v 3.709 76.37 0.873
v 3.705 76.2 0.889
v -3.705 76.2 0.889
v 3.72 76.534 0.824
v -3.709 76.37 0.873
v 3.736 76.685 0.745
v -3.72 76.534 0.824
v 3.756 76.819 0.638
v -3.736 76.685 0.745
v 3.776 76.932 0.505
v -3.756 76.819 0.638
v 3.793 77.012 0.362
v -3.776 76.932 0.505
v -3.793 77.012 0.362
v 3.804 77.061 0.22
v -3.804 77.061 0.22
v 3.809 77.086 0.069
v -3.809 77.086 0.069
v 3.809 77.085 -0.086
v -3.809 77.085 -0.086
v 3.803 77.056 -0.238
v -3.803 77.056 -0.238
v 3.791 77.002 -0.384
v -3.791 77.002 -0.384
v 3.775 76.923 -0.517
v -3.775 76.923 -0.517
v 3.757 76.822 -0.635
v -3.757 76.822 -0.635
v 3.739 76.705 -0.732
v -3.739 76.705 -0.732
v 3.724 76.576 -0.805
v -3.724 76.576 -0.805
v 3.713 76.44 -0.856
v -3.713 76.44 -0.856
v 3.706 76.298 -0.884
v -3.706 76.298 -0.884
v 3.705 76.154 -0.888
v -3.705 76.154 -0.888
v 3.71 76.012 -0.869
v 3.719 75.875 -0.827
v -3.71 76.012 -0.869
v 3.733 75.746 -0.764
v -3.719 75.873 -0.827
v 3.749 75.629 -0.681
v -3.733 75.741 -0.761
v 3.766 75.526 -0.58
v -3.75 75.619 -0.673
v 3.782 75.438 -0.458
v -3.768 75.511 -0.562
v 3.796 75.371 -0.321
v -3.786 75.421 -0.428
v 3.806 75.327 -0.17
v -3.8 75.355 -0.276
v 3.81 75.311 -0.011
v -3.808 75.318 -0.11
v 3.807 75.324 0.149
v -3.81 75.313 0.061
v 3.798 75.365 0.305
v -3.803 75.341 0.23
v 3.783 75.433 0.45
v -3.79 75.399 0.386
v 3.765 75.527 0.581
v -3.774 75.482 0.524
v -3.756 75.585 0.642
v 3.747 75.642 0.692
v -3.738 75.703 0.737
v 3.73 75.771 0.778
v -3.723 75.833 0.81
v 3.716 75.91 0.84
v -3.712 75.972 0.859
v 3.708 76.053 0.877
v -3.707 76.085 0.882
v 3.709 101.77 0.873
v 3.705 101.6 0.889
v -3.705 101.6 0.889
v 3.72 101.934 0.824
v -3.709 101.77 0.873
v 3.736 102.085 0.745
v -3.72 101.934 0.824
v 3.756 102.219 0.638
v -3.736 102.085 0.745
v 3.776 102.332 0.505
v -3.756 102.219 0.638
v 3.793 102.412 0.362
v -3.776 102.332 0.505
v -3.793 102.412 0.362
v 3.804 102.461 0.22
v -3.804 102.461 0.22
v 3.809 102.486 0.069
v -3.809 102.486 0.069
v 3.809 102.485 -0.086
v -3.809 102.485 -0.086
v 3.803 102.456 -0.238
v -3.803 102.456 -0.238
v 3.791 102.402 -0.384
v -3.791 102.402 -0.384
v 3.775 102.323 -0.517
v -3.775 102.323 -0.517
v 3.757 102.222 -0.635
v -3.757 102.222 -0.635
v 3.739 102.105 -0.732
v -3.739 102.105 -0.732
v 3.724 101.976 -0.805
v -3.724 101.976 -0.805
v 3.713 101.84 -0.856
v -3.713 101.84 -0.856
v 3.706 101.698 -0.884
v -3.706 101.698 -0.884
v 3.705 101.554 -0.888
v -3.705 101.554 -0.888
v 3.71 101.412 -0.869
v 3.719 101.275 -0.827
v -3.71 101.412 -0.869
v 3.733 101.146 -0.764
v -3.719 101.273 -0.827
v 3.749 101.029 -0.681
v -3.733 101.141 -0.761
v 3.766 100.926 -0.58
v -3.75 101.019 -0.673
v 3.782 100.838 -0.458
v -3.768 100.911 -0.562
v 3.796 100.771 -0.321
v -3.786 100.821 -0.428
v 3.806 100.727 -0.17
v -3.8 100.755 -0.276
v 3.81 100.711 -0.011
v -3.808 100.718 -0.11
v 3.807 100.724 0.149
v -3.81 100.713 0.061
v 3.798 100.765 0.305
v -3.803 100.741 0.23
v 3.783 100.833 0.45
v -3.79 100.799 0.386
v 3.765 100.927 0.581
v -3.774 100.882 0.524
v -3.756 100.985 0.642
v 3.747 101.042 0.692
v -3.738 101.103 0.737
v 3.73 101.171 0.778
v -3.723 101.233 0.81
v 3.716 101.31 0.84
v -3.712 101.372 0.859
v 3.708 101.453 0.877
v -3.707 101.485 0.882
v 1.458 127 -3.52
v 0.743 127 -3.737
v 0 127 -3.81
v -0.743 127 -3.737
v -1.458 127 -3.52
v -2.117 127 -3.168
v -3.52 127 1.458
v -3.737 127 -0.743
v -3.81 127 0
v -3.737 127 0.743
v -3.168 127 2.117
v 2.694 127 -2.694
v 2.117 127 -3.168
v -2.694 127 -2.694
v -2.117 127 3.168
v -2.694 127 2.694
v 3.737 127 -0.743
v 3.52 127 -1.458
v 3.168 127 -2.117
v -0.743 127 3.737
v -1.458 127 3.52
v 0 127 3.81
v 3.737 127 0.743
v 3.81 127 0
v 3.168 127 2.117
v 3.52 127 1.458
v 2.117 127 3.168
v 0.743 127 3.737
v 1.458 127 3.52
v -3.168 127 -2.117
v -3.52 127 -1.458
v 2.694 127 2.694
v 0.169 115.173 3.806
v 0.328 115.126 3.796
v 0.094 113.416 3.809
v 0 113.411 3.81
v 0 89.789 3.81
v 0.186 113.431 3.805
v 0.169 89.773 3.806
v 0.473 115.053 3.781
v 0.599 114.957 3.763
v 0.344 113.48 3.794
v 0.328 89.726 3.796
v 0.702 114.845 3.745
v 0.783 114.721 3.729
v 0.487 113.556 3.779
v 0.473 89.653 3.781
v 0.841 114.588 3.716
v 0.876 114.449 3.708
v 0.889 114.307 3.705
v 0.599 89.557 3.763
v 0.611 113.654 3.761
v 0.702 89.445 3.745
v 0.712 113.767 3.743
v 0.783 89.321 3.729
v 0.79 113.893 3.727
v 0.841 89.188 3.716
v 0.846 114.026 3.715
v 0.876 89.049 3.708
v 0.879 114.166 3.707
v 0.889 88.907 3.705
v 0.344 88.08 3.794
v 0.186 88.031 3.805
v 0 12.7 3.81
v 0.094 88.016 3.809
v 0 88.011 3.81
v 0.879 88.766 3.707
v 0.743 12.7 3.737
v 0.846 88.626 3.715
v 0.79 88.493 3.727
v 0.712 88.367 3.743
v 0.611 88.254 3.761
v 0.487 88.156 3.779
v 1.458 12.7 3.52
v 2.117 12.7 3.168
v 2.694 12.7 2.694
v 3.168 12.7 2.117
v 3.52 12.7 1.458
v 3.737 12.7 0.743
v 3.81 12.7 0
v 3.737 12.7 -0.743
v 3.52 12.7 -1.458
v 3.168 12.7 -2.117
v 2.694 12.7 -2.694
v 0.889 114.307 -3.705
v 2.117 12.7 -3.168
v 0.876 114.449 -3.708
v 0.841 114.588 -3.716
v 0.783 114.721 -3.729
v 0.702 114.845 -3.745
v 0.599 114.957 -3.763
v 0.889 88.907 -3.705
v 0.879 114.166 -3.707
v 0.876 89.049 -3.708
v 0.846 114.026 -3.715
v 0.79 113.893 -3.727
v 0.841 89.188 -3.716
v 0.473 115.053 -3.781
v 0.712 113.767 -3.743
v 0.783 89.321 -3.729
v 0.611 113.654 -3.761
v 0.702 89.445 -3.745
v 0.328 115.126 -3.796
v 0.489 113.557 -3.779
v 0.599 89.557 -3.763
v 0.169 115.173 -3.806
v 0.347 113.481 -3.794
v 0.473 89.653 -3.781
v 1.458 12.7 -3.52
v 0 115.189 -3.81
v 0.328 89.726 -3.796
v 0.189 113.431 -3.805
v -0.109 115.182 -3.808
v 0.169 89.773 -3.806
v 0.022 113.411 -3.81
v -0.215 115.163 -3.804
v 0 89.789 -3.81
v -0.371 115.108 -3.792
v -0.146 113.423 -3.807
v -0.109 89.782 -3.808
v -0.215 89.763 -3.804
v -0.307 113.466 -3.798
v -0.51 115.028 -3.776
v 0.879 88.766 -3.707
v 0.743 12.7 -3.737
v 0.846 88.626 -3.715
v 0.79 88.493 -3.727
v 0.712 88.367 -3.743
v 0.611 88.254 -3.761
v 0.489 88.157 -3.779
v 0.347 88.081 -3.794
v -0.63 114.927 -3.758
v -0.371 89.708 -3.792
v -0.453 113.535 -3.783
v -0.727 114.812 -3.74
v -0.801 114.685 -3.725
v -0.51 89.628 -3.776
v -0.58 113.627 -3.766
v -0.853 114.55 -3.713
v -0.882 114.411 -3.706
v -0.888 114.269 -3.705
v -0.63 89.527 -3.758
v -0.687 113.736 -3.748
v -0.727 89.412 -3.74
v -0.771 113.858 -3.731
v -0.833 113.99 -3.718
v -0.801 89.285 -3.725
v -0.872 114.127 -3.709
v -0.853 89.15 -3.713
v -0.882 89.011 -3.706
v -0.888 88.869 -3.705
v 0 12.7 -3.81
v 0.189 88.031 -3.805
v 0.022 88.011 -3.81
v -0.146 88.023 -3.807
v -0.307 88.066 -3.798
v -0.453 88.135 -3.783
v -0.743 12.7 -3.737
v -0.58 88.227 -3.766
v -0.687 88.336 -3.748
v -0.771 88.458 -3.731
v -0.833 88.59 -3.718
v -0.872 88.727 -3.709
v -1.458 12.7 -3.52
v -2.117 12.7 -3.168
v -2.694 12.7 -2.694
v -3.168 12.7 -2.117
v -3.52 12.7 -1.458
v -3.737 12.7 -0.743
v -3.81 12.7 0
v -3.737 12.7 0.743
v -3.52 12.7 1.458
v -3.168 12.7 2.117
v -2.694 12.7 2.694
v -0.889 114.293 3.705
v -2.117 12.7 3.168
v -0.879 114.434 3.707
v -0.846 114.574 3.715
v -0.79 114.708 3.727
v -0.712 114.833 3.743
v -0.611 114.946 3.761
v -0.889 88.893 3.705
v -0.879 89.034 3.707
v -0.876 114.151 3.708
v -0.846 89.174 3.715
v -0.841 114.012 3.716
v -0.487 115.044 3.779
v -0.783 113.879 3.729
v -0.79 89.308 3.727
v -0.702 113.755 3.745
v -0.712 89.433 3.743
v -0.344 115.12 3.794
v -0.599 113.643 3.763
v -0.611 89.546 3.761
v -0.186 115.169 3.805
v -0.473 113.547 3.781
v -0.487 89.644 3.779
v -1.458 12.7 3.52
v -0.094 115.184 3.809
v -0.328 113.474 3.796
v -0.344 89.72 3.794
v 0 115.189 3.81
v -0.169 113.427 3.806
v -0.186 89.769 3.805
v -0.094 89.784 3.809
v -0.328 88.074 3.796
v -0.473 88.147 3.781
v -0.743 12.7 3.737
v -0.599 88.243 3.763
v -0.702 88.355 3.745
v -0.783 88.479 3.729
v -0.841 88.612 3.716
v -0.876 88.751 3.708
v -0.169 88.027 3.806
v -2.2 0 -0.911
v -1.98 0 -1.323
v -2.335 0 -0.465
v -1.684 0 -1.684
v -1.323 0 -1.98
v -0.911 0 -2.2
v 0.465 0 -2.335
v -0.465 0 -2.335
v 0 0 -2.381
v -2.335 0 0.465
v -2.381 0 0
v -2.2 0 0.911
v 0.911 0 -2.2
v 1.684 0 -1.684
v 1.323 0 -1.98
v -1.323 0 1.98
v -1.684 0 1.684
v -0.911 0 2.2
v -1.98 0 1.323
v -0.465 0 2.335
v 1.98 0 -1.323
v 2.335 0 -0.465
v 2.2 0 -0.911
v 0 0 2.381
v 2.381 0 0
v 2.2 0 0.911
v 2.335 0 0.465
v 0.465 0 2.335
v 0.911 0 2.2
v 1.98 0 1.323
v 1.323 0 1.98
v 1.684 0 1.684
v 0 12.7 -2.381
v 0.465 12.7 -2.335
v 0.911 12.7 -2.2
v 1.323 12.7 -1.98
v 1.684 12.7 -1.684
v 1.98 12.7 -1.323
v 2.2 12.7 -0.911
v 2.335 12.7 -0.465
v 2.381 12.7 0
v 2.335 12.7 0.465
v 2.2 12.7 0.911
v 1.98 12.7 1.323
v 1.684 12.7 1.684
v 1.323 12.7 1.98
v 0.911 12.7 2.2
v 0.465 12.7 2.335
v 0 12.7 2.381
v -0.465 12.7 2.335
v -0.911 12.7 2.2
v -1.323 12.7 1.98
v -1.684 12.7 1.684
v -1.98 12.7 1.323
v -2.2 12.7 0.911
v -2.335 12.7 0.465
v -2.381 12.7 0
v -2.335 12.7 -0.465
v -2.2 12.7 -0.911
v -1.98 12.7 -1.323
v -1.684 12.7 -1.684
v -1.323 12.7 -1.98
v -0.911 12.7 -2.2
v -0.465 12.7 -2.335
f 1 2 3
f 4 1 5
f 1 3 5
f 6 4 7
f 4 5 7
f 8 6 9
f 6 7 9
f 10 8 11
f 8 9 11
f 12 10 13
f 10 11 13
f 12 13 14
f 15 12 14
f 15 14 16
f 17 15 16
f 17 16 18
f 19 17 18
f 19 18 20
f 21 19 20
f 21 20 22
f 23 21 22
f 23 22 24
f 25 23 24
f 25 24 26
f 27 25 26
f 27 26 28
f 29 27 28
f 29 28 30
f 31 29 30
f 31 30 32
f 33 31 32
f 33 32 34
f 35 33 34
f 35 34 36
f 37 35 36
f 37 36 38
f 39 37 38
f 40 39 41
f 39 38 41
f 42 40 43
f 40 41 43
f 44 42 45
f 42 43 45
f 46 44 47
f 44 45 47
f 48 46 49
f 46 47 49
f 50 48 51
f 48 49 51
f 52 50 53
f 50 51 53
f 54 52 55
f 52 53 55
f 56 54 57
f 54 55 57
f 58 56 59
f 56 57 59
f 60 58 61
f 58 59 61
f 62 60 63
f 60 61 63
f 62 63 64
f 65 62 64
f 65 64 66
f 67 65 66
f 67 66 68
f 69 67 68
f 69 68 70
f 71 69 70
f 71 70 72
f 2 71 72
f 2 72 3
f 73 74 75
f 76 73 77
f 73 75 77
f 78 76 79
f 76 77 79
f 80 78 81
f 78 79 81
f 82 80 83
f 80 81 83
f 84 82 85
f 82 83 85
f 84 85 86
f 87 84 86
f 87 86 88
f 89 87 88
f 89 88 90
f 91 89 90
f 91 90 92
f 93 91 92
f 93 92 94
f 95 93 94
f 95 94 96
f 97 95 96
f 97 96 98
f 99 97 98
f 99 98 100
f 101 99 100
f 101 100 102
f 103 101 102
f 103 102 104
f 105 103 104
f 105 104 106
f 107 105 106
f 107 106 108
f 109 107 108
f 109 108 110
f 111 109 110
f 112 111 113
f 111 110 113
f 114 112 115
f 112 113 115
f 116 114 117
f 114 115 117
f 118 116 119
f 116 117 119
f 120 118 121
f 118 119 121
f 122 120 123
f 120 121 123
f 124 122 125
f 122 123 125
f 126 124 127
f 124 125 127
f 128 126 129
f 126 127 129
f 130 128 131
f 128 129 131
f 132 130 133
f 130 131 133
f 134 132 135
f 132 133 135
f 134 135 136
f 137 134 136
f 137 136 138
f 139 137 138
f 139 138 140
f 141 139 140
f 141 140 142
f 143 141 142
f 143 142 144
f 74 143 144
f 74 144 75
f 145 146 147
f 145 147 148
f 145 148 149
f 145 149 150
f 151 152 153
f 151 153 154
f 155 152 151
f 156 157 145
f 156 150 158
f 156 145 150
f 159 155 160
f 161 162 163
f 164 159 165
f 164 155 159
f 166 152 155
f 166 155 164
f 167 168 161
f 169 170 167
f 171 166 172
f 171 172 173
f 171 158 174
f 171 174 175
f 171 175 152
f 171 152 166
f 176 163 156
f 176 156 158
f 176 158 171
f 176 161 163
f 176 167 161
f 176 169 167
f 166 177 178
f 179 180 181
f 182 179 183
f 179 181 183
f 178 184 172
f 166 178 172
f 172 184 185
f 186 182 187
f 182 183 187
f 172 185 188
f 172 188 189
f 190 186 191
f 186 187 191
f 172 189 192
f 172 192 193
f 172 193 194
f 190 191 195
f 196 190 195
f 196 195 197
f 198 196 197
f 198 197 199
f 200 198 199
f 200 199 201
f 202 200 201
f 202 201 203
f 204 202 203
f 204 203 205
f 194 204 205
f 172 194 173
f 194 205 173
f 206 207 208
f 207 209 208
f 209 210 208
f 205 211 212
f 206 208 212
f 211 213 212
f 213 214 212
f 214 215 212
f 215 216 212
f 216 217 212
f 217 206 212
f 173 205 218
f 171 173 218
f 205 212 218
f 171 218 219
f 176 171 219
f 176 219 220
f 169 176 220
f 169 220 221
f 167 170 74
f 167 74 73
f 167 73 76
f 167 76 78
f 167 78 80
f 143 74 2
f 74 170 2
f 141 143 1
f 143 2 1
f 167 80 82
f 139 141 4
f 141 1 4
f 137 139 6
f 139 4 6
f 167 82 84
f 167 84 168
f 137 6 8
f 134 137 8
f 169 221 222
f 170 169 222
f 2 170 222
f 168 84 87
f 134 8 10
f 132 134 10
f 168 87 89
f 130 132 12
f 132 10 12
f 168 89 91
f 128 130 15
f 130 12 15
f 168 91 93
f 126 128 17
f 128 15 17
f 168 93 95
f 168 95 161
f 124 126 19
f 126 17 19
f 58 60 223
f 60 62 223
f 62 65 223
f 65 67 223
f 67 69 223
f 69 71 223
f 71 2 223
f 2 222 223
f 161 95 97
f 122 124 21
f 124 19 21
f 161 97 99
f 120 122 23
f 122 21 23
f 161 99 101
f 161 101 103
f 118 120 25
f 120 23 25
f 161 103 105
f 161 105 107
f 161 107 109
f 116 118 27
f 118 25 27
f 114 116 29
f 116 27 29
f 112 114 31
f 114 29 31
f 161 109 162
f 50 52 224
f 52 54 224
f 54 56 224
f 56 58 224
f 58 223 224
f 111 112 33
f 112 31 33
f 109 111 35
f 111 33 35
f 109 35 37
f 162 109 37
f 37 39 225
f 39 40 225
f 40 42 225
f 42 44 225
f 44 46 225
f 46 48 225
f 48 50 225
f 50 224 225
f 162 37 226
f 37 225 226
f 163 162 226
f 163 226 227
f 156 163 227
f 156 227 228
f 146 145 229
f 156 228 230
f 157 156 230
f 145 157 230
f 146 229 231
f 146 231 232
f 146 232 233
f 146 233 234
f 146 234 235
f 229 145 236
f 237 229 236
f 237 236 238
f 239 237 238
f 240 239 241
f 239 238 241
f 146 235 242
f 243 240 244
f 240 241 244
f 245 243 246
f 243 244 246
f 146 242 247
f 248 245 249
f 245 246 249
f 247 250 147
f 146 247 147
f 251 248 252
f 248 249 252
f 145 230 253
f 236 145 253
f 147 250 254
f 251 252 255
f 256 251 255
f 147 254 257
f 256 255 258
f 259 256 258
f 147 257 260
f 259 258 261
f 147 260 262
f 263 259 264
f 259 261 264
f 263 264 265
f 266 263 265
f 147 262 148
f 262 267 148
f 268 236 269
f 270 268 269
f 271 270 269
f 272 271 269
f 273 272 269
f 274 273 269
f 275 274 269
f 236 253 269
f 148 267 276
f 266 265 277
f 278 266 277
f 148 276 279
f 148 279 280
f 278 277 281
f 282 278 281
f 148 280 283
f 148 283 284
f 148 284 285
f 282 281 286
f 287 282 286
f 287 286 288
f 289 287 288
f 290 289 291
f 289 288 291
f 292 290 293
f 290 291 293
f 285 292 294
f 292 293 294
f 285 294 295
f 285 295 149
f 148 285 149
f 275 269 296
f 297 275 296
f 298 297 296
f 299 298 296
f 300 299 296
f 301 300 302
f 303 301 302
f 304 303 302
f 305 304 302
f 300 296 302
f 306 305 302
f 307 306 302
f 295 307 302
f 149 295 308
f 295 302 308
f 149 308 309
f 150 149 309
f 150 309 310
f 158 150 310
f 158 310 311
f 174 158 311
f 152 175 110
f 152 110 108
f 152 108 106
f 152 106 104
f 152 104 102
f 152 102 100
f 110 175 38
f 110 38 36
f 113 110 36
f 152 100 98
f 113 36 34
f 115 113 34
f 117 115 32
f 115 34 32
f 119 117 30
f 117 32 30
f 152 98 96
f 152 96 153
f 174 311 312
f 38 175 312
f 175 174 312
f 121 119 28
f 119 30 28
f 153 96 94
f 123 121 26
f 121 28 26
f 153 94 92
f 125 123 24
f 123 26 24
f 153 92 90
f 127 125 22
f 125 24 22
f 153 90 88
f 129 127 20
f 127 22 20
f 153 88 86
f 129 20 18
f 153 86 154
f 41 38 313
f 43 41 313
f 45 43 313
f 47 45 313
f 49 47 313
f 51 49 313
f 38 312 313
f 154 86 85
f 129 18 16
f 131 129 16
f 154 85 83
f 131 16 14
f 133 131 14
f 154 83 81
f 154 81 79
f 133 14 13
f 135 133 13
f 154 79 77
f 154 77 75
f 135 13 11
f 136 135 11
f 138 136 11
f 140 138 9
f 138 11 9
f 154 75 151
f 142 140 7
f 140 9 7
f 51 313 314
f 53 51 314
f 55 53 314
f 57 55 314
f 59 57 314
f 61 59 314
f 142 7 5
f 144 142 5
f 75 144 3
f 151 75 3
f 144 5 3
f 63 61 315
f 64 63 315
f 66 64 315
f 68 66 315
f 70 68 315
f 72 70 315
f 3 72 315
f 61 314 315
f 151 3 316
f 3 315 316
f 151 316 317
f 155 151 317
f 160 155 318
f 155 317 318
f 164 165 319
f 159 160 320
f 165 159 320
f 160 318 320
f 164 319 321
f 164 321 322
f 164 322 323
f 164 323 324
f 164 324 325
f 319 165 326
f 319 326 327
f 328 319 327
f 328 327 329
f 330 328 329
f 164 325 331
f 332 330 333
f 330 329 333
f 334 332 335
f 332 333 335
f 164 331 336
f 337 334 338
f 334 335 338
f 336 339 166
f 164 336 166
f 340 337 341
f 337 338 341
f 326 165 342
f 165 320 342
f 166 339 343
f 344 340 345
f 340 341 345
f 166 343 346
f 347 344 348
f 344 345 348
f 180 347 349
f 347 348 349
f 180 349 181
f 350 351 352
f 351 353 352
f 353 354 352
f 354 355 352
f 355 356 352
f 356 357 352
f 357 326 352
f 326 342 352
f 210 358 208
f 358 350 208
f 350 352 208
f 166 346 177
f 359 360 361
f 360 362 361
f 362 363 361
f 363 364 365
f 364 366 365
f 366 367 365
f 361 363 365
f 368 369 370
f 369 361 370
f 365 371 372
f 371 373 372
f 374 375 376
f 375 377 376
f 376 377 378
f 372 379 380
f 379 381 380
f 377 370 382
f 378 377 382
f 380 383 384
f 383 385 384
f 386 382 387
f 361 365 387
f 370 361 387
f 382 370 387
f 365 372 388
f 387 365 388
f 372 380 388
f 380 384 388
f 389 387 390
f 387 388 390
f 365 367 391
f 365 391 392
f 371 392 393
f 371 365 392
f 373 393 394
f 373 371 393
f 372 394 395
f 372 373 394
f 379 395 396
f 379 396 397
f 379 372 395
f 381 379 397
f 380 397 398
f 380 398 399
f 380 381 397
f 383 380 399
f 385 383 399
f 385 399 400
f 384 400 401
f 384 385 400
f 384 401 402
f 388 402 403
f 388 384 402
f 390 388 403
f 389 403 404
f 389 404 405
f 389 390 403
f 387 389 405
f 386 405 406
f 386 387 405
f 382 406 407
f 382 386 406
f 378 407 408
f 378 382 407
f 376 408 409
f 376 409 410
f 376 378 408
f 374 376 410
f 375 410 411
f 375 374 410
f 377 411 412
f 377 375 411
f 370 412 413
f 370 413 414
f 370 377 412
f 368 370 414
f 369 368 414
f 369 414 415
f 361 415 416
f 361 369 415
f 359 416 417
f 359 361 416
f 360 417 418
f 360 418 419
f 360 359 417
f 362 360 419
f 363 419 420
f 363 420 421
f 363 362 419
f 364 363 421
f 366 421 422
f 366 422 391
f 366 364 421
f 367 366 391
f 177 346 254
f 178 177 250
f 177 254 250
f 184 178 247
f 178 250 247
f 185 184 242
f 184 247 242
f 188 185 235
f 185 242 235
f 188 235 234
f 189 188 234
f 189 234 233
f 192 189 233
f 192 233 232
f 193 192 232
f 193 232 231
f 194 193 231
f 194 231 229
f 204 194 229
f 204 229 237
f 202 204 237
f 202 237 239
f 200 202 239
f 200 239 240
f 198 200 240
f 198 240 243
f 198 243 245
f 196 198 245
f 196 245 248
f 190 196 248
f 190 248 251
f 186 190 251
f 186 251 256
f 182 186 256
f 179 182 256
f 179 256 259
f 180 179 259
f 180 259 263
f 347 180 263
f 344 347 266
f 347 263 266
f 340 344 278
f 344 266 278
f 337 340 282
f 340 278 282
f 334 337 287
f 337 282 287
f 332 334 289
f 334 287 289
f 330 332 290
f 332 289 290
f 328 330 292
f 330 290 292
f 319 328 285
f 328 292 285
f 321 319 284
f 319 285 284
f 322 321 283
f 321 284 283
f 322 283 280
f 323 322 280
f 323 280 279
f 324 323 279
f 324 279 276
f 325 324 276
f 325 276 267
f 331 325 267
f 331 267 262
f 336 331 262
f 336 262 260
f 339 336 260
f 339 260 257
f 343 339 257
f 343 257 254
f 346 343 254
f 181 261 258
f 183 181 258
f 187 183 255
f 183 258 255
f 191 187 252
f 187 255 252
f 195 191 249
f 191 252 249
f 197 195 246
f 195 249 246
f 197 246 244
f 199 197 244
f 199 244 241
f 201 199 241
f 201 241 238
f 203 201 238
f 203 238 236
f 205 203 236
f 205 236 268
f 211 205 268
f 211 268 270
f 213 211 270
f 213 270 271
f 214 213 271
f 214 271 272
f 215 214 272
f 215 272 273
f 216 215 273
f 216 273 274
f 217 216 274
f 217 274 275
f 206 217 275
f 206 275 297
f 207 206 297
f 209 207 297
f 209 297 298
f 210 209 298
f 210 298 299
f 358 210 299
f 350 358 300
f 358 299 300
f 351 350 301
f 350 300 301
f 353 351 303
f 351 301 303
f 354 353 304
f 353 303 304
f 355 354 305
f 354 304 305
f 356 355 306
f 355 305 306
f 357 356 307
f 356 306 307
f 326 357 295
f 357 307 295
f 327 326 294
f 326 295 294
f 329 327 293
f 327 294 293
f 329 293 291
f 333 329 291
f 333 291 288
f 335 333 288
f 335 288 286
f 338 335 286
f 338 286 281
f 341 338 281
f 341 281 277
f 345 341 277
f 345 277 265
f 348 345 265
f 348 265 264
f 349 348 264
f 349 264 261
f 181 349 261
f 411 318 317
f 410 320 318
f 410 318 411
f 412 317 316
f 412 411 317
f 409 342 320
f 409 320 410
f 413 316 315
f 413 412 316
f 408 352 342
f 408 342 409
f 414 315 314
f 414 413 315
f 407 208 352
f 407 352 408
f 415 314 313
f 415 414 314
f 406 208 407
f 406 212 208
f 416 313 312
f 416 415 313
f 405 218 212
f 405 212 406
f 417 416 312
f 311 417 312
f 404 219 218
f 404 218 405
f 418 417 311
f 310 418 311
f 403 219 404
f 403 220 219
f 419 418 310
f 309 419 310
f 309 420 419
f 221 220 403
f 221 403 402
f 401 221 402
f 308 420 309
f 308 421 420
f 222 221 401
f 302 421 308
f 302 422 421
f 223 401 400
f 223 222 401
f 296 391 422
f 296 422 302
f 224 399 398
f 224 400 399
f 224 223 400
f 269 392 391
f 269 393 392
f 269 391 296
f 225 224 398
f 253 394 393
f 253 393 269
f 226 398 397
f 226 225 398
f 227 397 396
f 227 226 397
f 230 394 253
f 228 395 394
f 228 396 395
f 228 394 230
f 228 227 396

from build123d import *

# Parameters (mm, degrees)
SKETCH1_R             = 3.81
BOSS_EXTRUDE1_DEPTH   = 127
F_2_64_TAPPED_HOLE1_D = 1.778
F_2_64_TAPPED_HOLE2_D = 1.778
LPATTERN1_COUNT       = 2
LPATTERN1_PITCH       = 25.4
LPATTERN2_COUNT       = 2
LPATTERN2_PITCH       = 25.4
SKETCH22_R            = 3.81
SKETCH22_R_2          = 2.38125
CUT_EXTRUDE1_DEPTH    = 12.7


with BuildPart() as part:
    # Sketch1 → Boss-Extrude1 (new body)
    with BuildSketch(Plane(origin=(0, 0, 0), x_dir=(1, 0, 0), z_dir=(0, 1, 0))):
        with Locations(Location((0, 0, 0), (0, 0, 270))):
            Circle(SKETCH1_R)
    extrude(amount=BOSS_EXTRUDE1_DEPTH)

    # #2-64 Tapped Hole1 (through all)
    with Locations(Plane(origin=(3.81, 0, 0), x_dir=(0, 0, -1), z_dir=(1, 0, 0))):
        with Locations((0, 76.2)):
            f_2_64_tapped_hole1 = Hole(F_2_64_TAPPED_HOLE1_D / 2)

    # #2-64 Tapped Hole2 (through all)
    with Locations(Plane(origin=(0, 0, 3.81), x_dir=(0, -1, 0), z_dir=(0, 0, 1))):
        with Locations((-88.9, 0)):
            f_2_64_tapped_hole2 = Hole(F_2_64_TAPPED_HOLE2_D / 2)

    # LPattern1: #2-64 Tapped Hole1 ×2
    with Locations(*[(0, i * LPATTERN1_PITCH, 0) for i in range(1, LPATTERN1_COUNT)]):
        add(f_2_64_tapped_hole1, mode=Mode.SUBTRACT)

    # LPattern2: #2-64 Tapped Hole2 ×2
    with Locations(*[(0, i * LPATTERN2_PITCH, 0) for i in range(1, LPATTERN2_COUNT)]):
        add(f_2_64_tapped_hole2, mode=Mode.SUBTRACT)

    # Sketch22 → Cut-Extrude1 (cut)
    with BuildSketch(Plane.XZ):
        with Locations(Location((0, 0, 0), (0, 0, 270))):
            Circle(SKETCH22_R)
        with Locations(Location((0, 0, 0), (0, 0, 270))):
            Circle(SKETCH22_R_2, mode=Mode.SUBTRACT)
    extrude(amount=-CUT_EXTRUDE1_DEPTH, mode=Mode.SUBTRACT)


solid = part.part
